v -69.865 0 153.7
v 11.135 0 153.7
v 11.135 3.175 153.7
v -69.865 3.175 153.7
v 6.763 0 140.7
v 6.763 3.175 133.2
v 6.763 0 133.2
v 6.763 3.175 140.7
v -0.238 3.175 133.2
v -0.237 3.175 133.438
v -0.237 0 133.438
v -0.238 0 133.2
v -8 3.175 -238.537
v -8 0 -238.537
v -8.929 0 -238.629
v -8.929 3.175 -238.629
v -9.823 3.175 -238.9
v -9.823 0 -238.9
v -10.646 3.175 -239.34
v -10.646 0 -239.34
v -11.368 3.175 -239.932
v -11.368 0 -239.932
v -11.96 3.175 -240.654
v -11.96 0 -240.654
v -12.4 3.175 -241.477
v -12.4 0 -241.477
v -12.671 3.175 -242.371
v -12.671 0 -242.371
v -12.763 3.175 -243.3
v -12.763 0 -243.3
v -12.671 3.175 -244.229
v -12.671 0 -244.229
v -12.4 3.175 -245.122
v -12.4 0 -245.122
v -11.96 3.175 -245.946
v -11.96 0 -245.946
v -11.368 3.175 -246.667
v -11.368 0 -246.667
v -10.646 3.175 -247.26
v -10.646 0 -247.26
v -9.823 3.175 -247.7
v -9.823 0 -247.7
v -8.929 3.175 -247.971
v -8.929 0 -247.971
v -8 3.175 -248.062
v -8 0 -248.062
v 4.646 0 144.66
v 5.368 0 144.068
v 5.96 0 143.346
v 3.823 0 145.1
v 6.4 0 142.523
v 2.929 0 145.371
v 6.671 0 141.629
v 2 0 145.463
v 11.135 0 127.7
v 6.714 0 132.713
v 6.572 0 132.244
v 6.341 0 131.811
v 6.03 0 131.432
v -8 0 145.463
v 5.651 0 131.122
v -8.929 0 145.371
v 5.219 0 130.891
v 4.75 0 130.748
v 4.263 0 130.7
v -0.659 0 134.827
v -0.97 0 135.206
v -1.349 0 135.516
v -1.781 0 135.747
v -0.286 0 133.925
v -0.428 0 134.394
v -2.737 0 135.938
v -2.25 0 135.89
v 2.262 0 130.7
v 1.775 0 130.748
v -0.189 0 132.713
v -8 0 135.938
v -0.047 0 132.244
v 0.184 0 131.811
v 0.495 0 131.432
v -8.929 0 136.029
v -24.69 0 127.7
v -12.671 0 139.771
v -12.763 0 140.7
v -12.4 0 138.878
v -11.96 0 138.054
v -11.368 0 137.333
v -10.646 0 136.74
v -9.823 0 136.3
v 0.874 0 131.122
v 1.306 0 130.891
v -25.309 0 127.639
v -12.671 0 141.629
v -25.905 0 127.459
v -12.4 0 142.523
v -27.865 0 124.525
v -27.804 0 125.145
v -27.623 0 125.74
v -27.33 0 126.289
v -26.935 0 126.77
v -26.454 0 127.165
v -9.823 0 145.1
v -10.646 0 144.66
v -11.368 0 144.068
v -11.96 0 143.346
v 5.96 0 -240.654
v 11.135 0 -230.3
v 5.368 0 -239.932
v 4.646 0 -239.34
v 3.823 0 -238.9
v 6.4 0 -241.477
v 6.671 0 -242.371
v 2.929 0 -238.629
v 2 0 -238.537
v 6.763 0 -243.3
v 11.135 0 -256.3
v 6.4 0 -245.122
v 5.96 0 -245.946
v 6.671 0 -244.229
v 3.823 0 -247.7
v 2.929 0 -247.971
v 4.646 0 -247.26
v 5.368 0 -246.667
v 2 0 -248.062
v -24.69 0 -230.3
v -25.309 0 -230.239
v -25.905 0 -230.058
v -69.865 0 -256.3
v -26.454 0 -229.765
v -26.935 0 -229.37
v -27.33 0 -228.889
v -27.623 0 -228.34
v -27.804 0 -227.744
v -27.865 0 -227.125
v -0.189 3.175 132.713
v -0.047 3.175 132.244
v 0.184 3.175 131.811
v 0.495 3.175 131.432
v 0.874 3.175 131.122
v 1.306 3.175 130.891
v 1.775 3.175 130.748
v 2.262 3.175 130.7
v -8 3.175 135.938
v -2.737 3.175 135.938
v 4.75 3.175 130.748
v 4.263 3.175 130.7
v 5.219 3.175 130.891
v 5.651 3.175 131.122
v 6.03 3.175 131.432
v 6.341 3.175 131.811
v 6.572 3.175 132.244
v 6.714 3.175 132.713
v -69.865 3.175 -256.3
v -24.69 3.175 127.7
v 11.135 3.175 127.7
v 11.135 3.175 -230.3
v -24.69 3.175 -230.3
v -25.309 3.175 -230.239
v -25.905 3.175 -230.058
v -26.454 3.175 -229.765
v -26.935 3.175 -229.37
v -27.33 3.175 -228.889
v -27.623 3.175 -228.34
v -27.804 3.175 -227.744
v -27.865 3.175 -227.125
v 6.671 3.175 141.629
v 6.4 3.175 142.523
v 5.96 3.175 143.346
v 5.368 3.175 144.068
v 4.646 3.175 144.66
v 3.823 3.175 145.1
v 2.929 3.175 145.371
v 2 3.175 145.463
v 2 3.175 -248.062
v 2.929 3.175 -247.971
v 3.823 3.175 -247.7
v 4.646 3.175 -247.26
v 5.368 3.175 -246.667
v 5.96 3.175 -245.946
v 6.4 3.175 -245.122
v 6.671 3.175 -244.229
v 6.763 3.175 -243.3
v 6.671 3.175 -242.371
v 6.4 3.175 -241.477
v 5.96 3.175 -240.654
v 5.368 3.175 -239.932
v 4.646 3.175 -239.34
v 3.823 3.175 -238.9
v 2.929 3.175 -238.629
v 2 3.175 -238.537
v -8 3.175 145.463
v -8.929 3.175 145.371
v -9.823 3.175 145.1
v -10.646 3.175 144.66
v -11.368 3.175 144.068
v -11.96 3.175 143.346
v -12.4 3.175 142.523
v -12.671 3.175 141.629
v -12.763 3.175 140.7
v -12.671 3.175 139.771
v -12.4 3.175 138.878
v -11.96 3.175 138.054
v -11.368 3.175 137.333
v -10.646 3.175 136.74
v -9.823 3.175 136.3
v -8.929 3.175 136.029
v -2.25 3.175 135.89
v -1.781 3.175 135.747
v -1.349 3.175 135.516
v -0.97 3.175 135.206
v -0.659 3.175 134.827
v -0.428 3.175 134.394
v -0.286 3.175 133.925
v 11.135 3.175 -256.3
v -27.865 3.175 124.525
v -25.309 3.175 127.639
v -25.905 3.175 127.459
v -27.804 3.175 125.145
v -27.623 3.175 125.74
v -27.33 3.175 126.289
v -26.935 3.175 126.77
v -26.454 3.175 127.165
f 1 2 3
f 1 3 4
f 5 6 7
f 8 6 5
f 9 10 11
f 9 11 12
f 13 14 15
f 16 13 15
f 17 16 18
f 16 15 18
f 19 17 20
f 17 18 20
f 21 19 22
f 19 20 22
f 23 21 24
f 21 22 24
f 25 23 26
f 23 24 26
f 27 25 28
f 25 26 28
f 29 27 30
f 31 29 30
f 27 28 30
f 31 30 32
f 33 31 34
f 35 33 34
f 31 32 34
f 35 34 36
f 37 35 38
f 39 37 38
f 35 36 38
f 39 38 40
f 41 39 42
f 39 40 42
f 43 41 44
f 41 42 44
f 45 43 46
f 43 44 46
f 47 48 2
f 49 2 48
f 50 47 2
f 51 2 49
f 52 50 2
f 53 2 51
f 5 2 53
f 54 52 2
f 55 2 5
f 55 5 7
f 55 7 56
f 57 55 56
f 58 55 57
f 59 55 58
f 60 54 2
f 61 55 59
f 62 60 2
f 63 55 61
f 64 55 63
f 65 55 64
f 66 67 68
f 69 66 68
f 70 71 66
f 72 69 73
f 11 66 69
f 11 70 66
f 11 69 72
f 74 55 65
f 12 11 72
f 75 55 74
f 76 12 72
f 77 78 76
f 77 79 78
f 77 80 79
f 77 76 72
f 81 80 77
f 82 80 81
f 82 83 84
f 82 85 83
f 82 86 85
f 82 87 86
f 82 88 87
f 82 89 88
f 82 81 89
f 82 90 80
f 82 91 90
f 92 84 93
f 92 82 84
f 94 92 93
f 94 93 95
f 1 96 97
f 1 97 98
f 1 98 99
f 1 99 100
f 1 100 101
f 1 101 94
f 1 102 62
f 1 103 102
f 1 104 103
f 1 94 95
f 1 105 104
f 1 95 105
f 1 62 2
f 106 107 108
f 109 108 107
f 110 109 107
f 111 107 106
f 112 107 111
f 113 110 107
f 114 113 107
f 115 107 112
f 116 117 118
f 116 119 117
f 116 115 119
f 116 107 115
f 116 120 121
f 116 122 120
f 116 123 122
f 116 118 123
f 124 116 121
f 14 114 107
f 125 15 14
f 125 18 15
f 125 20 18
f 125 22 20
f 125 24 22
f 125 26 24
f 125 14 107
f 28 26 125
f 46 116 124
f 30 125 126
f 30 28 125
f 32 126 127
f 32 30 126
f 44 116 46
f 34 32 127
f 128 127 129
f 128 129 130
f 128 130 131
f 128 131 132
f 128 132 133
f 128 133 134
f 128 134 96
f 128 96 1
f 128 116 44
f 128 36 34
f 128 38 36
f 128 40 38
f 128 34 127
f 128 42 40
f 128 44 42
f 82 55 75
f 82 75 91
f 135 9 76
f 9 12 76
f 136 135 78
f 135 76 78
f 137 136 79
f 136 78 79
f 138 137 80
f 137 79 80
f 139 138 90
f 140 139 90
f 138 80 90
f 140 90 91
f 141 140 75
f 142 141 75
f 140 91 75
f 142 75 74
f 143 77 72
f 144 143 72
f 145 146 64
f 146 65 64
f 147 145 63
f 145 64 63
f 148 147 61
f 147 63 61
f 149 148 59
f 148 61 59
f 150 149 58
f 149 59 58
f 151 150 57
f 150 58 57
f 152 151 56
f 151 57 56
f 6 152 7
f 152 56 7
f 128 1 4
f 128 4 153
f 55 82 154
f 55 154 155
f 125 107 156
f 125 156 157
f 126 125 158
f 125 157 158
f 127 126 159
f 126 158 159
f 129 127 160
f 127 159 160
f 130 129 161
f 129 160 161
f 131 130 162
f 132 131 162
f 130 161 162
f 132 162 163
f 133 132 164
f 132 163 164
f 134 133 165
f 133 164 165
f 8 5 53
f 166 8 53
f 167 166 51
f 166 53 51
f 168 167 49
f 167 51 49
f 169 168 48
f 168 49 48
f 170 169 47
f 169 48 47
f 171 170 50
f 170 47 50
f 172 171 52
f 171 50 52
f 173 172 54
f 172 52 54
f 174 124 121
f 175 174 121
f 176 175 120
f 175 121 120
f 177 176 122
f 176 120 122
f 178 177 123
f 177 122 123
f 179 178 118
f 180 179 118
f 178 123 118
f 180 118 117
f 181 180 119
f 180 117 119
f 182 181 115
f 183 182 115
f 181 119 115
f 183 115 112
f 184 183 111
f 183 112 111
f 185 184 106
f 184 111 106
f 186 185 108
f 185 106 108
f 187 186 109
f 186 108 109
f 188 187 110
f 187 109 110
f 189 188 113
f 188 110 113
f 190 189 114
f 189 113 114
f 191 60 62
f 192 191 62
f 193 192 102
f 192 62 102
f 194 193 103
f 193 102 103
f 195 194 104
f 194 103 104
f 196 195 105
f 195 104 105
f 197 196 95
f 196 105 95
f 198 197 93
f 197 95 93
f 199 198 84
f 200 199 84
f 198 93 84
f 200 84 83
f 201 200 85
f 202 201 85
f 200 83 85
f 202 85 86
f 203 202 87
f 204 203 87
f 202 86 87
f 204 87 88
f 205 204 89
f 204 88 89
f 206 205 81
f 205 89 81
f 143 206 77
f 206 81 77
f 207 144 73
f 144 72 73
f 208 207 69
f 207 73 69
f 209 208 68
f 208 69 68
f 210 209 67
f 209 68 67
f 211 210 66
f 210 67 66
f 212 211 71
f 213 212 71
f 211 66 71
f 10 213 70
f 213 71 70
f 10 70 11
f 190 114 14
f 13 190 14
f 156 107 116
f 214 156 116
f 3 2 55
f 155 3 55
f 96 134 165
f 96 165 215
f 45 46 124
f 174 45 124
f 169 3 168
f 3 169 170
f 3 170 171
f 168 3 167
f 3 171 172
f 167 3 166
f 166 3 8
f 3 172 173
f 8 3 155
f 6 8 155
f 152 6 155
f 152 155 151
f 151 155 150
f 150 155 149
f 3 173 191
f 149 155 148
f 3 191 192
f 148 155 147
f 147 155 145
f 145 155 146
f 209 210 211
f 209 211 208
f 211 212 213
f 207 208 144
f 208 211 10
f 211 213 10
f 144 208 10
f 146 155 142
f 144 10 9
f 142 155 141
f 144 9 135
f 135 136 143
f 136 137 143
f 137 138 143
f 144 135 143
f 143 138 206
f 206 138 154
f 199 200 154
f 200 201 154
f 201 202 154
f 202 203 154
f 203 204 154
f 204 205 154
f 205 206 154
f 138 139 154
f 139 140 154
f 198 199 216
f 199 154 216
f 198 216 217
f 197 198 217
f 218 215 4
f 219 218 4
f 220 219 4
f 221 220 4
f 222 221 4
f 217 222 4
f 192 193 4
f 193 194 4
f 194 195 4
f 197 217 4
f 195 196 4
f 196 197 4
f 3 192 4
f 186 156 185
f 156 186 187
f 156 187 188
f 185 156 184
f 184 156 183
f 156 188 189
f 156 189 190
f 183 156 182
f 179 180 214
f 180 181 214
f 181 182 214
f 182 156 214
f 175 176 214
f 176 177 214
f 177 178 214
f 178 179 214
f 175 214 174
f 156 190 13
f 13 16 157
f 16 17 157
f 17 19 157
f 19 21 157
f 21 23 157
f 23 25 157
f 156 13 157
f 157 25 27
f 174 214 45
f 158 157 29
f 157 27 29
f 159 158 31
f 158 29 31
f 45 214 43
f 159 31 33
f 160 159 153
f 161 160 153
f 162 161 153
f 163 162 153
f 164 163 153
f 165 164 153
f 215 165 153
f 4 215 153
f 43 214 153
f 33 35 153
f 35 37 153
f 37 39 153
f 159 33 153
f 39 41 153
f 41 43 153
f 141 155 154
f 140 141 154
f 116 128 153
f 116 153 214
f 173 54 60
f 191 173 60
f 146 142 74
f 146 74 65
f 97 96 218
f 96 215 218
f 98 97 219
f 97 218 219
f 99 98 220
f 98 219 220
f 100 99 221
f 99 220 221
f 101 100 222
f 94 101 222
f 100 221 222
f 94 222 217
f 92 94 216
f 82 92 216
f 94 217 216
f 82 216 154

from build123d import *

# Parameters (mm, degrees)
EXTRUDE1_DEPTH     = 3.175
CUT_EXTRUDE2_DEPTH = 4.175
FILLET1_R          = 2.5
FILLET2_R          = 3.175


with BuildPart() as part:
    # Sketch1 → Extrude1 (new body)
    with BuildSketch(Plane(origin=(0, 0, 0), x_dir=(1, 0, 0), z_dir=(0, 1, 0))):
        Polygon((-69.865, 256.29975), (11.135, 256.29975), (11.135, 248.06225), (11.135, 238.53725), (11.135, 230.29975), (-27.865, 230.29975), (-27.865, -127.70025), (11.135, -127.70025), (11.135, -145.46275), (11.135, -153.70025), (-69.865, -153.70025), align=None)
        with BuildLine():
            Line((-8, -135.93775), (2, -135.93775))
            ThreePointArc((2, -135.93775), (6.7625, -140.70025), (2, -145.46275))
            Line((2, -145.46275), (-8, -145.46275))
            ThreePointArc((-8, -145.46275), (-12.7625, -140.70025), (-8, -135.93775))
        make_face(mode=Mode.SUBTRACT)
        with BuildLine():
            Line((-8, 248.06225), (2, 248.06225))
            ThreePointArc((2, 248.06225), (6.7625, 243.29975), (2, 238.53725))
            Line((2, 238.53725), (-8, 238.53725))
            ThreePointArc((-8, 238.53725), (-12.7625, 243.29975), (-8, 248.06225))
        make_face(mode=Mode.SUBTRACT)
    extrude(amount=EXTRUDE1_DEPTH)

    # Sketch2 → Cut-Extrude2 (cut, through all)
    with BuildSketch(Plane(origin=(0, 3.175, 0), x_dir=(1, 0, 0), z_dir=(0, 1, 0))):
        with BuildLine():
            Line((-0.2375, -135.93775), (-0.2375, -130.70025))
            Line((-0.2375, -130.70025), (6.7625, -130.70025))
            Line((6.7625, -130.70025), (6.7625, -140.70025))
            ThreePointArc((6.7625, -140.70025), (5.367596045, -137.332653955), (2, -135.93775))
            Line((2, -135.93775), (-0.2375, -135.93775))
        make_face()
    extrude(amount=-CUT_EXTRUDE2_DEPTH, mode=Mode.SUBTRACT)

    # Fillet1
    fillet1_edges = [part.edges().sort_by_distance(p)[0] for p in [
        (-0.2375, 1.5875, 135.93775),
        (-0.2375, 1.5875, 130.70025),
        (6.7625, 1.5875, 130.70025),
    ]]
    fillet(fillet1_edges, radius=FILLET1_R)

    # Fillet2
    fillet2_edges = [part.edges().sort_by_distance(p)[0] for p in [
        (-27.865, 1.5875, -230.29975),
        (-27.865, 1.5875, 127.70025),
    ]]
    fillet(fillet2_edges, radius=FILLET2_R)


solid = part.part
